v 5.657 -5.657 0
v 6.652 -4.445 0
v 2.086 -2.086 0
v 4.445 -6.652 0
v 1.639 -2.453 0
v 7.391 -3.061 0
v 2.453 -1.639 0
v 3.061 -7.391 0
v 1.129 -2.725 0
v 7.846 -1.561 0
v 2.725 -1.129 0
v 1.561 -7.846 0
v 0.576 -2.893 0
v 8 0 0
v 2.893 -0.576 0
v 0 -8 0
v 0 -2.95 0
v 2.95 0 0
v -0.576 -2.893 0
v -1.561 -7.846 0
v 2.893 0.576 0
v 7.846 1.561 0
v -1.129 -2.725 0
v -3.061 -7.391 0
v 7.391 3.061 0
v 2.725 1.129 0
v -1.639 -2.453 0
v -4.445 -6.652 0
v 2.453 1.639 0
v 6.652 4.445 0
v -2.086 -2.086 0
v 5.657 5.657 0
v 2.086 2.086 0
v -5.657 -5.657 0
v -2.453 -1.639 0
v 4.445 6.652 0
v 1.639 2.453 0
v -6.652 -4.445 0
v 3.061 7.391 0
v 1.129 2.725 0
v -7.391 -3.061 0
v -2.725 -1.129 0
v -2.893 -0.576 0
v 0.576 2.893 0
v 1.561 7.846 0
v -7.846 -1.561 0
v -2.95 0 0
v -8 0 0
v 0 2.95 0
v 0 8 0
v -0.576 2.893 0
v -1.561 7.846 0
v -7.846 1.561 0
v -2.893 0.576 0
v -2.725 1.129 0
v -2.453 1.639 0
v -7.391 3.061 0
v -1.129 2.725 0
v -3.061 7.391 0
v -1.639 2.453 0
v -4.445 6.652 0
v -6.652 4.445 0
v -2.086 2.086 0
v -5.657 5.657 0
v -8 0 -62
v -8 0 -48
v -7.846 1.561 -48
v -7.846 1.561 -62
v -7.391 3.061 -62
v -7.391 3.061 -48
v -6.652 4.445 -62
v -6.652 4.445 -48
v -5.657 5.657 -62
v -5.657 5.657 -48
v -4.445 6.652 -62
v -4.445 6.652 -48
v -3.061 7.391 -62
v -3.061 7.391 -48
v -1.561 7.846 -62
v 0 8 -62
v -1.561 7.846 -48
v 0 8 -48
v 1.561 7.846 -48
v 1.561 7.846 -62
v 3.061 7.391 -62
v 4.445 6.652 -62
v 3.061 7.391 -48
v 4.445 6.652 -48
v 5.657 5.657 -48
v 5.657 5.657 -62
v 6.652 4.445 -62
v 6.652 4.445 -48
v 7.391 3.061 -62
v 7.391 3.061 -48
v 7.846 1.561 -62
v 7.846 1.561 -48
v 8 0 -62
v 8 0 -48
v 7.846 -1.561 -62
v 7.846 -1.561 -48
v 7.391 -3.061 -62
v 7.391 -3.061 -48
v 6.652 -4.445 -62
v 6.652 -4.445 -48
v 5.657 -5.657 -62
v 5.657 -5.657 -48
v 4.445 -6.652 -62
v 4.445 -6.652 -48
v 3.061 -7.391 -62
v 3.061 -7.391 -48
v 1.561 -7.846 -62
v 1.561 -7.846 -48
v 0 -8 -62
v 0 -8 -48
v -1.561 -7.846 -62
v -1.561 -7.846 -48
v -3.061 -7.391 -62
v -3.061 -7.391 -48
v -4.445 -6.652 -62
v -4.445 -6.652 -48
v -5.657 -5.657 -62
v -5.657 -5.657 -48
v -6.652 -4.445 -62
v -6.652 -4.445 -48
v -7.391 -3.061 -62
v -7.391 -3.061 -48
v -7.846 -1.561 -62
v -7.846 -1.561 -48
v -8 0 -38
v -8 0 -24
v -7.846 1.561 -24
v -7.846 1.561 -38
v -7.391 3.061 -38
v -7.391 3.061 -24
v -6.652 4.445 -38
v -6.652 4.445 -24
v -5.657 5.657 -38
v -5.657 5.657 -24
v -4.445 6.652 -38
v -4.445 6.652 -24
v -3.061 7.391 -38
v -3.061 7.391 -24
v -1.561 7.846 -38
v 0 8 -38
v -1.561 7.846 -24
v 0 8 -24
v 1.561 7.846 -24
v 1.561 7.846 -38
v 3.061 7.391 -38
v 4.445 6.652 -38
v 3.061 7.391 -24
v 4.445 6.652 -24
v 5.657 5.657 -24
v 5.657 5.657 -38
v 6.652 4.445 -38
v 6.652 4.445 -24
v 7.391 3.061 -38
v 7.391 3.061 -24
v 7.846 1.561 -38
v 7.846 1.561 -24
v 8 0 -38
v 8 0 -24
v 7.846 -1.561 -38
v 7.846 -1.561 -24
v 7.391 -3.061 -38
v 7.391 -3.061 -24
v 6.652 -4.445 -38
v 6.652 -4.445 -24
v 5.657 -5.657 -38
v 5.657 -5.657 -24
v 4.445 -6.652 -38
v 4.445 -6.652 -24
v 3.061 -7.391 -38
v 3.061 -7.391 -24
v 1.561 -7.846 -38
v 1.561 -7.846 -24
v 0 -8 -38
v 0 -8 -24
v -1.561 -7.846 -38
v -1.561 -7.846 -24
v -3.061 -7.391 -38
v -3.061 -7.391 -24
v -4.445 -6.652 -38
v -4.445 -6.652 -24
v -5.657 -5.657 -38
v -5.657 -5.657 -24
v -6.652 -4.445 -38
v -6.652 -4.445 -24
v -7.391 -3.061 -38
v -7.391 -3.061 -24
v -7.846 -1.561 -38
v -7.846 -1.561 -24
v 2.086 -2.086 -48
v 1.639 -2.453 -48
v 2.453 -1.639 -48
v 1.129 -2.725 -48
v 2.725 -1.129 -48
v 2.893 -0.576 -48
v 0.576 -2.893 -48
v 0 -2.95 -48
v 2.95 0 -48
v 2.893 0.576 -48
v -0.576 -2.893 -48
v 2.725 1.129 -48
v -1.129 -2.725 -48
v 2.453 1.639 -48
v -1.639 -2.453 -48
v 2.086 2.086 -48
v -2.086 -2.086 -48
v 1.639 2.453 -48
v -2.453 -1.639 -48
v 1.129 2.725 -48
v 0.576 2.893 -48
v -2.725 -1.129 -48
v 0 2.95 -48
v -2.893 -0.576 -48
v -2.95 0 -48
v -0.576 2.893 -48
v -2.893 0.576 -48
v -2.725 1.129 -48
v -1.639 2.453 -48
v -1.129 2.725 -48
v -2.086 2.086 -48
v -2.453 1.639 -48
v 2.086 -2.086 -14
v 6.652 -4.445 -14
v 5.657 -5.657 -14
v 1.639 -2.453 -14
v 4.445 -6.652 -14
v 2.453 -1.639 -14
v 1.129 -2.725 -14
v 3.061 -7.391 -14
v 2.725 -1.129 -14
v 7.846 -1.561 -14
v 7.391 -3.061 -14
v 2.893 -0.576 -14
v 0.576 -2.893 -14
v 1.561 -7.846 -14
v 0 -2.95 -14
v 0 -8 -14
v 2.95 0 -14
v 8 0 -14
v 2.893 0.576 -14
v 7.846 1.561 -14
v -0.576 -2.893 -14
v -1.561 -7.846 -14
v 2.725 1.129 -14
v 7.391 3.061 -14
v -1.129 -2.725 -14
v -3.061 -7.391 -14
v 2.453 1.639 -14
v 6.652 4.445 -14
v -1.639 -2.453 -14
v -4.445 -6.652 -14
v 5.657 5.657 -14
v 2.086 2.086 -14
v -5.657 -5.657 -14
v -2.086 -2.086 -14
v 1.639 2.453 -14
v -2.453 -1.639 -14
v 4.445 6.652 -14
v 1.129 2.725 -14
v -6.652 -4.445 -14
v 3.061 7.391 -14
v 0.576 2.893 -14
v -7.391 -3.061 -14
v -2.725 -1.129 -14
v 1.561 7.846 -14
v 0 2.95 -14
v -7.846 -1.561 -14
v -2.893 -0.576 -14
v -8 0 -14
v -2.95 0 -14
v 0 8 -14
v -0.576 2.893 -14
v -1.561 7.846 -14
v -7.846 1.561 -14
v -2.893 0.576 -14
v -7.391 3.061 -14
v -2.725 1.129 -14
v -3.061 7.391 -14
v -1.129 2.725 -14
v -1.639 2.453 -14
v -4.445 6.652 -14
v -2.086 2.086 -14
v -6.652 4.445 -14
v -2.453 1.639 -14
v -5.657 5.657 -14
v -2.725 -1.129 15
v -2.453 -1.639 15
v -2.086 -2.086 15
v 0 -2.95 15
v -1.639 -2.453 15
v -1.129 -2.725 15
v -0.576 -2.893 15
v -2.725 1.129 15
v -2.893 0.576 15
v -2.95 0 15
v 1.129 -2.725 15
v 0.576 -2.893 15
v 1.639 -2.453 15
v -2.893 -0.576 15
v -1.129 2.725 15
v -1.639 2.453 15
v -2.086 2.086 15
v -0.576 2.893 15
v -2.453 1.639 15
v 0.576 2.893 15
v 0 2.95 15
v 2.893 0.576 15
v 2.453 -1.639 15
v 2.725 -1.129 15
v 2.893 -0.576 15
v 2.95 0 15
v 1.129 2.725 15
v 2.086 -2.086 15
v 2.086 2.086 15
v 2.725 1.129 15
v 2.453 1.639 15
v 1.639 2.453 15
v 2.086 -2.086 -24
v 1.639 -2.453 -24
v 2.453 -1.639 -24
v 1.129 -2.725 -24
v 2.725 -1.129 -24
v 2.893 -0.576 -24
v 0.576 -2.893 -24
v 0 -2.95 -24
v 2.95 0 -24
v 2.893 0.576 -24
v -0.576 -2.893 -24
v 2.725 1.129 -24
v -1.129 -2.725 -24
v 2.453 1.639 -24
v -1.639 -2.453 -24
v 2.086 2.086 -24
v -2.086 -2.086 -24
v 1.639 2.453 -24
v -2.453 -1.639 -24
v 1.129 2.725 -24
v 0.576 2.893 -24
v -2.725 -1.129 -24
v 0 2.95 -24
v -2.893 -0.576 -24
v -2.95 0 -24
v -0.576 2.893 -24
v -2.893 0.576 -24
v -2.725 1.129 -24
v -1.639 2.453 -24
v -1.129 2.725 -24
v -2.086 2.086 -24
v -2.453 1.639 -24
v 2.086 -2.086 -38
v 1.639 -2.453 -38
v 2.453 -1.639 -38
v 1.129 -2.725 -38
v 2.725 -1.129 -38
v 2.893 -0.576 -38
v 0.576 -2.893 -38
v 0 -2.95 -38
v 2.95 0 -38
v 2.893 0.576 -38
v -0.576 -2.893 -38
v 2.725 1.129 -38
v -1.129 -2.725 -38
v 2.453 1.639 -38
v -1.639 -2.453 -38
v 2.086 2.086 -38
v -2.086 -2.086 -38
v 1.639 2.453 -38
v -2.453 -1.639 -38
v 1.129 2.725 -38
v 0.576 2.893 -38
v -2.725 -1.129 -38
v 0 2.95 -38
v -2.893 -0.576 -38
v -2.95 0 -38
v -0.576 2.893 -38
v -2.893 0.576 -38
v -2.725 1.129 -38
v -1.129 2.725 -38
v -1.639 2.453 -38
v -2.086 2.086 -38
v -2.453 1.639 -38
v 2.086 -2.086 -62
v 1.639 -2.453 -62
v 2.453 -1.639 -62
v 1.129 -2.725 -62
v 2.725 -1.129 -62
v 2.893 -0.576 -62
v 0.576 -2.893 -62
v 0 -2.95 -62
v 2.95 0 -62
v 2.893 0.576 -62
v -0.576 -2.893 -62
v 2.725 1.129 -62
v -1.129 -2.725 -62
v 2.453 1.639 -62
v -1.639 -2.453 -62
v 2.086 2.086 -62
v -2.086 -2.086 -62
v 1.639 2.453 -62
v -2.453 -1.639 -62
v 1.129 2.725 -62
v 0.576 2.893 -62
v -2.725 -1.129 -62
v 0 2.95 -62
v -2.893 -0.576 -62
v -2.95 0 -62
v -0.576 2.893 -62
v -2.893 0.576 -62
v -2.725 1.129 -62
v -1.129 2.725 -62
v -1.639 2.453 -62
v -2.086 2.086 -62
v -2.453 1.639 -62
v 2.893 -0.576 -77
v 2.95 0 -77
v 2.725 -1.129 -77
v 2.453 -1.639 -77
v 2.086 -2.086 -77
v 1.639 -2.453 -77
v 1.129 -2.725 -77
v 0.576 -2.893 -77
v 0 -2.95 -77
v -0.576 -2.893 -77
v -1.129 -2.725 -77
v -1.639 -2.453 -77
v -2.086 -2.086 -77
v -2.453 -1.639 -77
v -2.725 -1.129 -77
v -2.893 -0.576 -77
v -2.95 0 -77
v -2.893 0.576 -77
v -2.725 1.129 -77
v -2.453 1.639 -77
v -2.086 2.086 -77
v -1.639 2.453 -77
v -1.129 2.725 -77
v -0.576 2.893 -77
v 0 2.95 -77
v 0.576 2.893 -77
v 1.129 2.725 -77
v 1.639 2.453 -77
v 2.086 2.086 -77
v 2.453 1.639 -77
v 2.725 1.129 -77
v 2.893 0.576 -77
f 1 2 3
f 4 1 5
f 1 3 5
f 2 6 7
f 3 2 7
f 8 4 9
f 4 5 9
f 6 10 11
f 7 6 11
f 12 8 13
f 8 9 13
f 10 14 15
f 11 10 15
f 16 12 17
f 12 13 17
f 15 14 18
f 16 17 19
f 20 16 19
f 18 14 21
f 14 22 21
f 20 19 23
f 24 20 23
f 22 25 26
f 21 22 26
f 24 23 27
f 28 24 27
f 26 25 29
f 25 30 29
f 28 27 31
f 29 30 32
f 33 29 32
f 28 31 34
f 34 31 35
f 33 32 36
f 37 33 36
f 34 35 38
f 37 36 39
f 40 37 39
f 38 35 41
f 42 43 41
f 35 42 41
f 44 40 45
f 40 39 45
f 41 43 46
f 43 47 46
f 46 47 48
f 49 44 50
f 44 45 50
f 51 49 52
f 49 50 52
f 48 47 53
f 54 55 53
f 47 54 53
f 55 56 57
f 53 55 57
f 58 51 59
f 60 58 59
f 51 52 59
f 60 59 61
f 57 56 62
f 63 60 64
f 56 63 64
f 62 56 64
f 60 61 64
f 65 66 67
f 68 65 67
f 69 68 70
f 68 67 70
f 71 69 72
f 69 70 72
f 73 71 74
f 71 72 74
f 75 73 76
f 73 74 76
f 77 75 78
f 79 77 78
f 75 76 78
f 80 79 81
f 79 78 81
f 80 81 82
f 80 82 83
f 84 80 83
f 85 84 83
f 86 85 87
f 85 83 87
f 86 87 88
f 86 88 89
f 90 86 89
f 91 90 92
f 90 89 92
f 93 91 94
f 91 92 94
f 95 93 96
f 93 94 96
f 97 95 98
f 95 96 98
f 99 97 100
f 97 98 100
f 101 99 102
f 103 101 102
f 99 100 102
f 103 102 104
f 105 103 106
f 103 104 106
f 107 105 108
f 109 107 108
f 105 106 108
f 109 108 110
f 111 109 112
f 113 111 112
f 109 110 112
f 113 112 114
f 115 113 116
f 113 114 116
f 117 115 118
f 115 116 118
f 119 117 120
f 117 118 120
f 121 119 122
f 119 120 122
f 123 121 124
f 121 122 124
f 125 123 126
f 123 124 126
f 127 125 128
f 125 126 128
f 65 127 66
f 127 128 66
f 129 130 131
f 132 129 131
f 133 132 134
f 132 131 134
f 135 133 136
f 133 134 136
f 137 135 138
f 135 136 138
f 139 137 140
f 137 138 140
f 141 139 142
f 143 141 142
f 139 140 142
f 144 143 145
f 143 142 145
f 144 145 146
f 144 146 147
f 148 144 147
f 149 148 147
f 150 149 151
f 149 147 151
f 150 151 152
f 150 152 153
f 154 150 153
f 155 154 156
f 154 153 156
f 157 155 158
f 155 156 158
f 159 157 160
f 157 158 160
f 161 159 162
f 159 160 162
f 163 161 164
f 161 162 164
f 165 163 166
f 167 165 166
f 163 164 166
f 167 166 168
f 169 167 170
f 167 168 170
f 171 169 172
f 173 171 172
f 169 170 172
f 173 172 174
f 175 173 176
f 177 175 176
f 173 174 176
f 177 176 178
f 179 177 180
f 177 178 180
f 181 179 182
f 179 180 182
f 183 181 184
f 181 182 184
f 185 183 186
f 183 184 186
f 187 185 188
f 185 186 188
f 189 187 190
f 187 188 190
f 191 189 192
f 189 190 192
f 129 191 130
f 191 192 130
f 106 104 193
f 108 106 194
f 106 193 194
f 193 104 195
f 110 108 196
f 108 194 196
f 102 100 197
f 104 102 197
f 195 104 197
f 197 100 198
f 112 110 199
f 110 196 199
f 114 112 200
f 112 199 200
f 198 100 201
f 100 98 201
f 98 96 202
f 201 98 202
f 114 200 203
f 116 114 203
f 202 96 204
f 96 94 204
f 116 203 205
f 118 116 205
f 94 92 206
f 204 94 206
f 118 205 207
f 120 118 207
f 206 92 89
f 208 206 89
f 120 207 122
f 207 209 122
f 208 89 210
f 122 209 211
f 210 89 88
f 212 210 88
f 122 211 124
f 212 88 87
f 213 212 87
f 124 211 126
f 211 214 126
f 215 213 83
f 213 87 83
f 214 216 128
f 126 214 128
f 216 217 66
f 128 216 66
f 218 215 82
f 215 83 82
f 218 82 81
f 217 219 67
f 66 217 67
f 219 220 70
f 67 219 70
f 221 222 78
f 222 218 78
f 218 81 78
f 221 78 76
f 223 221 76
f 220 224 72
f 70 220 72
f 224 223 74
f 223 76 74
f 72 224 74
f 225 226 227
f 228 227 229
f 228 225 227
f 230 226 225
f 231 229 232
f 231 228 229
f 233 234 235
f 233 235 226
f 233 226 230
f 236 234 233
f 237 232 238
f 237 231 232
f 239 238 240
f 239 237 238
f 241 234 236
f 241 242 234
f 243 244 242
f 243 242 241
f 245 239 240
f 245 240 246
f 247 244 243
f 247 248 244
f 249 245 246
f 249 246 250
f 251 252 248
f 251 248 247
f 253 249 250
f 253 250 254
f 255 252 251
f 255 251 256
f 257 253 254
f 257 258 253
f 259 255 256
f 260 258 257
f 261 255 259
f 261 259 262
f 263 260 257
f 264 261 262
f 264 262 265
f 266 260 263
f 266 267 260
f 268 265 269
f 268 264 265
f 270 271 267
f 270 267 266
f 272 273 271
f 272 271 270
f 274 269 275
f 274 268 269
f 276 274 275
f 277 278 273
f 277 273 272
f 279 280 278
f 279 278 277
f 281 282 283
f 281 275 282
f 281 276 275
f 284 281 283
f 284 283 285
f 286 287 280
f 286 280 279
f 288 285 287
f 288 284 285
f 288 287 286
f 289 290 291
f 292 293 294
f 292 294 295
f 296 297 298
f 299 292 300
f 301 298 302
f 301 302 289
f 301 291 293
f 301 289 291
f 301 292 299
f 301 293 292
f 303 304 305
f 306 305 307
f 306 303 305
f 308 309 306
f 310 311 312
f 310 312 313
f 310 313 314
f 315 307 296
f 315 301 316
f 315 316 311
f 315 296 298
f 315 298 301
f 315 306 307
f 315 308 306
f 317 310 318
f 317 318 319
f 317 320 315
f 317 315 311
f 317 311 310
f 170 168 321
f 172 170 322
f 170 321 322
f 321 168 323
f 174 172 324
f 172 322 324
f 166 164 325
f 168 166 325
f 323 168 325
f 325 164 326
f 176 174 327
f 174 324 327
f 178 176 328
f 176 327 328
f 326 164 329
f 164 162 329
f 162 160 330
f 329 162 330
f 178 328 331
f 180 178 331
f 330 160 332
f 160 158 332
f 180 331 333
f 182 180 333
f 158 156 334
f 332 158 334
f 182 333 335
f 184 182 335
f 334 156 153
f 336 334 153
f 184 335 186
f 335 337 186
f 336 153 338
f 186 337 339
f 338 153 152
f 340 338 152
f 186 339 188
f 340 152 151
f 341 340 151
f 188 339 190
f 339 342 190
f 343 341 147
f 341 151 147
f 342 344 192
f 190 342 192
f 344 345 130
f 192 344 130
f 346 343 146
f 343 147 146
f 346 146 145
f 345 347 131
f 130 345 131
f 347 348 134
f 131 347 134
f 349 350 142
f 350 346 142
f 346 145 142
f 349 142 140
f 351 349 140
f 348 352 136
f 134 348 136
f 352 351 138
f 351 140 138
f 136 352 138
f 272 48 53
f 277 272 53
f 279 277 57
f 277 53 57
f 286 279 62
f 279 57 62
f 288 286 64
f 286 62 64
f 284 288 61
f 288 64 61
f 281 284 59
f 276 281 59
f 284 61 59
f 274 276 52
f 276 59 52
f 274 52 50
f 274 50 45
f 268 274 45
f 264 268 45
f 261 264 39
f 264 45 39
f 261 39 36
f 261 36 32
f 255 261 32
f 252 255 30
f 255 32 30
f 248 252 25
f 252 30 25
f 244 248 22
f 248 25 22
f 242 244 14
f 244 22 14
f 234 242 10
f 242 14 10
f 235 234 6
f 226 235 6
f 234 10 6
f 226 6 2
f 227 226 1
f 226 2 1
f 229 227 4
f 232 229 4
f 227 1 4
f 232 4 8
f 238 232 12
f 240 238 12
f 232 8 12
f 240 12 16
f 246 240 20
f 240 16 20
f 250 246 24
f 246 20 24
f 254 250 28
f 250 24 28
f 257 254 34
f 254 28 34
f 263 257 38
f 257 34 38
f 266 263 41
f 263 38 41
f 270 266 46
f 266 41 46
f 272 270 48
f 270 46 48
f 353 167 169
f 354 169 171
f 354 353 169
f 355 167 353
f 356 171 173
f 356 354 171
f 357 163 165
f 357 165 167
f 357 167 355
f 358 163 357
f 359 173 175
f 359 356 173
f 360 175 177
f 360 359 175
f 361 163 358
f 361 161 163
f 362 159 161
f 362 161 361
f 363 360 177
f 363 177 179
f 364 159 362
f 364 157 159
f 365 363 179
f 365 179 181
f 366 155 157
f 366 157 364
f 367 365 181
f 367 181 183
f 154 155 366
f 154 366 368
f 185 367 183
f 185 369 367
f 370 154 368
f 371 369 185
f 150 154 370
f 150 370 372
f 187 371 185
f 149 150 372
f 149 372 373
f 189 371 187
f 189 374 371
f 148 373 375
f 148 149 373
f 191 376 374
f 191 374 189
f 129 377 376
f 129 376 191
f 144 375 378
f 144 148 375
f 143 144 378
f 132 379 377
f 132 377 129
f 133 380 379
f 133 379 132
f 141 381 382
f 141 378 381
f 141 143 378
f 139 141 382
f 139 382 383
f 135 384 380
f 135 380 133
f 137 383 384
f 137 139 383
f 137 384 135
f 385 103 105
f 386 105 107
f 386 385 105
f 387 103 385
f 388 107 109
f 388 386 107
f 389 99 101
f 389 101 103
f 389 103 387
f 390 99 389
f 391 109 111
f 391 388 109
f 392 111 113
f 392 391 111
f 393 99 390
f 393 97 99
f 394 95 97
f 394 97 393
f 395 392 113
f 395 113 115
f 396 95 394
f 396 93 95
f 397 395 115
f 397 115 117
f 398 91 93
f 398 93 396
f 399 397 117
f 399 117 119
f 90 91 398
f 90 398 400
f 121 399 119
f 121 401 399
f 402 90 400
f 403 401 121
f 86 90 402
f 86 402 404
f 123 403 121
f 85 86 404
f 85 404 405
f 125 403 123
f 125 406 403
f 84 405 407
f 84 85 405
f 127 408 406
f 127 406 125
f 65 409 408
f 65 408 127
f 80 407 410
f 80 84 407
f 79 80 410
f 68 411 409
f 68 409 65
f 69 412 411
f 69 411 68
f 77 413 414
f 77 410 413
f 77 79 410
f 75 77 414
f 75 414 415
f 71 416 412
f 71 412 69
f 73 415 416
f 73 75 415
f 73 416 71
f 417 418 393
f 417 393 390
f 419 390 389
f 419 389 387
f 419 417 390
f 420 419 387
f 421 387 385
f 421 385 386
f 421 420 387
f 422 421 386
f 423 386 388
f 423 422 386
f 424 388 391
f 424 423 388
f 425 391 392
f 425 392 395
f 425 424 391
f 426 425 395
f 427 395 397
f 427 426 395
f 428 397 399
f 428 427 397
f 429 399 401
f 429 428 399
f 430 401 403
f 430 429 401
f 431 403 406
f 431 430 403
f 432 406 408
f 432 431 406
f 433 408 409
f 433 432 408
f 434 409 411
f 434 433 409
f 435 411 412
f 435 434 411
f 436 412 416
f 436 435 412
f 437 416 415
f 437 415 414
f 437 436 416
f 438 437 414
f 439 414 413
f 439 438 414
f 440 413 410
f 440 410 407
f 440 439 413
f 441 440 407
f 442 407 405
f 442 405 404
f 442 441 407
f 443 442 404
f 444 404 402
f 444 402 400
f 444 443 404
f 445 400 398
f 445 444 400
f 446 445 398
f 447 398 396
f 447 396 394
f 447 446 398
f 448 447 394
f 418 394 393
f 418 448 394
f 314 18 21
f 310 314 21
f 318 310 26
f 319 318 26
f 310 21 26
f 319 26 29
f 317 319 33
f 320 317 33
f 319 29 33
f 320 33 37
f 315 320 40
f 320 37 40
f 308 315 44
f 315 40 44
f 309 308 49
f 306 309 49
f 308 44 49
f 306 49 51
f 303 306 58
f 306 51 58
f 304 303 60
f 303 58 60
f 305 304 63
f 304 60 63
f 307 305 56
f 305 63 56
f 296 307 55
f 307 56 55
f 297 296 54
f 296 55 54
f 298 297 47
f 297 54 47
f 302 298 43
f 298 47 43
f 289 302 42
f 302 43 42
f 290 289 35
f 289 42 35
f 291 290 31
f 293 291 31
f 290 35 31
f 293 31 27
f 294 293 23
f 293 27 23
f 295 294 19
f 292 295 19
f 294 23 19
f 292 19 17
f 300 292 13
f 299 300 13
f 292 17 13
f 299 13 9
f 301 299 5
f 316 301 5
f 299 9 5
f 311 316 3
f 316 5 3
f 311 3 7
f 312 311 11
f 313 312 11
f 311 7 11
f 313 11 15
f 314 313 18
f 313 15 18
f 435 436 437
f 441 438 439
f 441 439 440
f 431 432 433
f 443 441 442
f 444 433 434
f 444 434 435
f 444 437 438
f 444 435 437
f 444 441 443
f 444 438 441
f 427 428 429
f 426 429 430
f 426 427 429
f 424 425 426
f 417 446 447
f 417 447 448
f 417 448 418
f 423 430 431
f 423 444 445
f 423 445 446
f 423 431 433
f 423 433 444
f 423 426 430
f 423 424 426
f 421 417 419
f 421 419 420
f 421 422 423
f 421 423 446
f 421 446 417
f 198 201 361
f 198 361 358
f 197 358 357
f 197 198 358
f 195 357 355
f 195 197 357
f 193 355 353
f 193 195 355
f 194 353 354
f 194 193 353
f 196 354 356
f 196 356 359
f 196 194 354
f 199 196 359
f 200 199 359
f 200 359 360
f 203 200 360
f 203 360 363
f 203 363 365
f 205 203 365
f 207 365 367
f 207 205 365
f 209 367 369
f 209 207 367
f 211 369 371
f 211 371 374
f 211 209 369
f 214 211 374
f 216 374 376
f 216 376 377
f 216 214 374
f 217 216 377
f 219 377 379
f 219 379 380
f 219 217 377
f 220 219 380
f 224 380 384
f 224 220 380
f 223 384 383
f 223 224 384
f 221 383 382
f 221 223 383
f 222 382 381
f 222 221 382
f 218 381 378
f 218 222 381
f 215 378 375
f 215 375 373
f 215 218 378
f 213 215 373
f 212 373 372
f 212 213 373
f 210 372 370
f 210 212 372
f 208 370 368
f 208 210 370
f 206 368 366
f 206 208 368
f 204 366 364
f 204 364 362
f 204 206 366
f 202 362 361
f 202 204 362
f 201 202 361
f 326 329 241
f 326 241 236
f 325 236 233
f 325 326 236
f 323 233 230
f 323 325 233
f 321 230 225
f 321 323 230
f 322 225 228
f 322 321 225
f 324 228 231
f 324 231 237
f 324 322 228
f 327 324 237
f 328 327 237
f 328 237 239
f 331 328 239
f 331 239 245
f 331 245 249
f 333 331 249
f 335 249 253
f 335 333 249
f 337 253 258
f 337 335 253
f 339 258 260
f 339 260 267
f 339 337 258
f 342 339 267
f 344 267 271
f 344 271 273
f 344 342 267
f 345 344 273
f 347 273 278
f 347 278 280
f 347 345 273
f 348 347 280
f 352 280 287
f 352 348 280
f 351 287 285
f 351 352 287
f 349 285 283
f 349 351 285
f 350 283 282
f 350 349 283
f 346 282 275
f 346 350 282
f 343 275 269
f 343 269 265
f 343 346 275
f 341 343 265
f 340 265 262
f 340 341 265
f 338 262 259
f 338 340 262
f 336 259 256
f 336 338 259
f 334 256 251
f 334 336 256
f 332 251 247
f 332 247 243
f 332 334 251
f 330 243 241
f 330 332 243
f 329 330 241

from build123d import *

# Parameters (mm, degrees)
CROQUIS1_R              = 2.95
SALIENTE_EXTRUIR1_DEPTH = 15
CROQUIS2_R              = 8
SALIENTE_EXTRUIR2_DEPTH = 14
SALIENTE_EXTRUIR3_START = 10
CROQUIS3_R              = 2.95
SALIENTE_EXTRUIR3_DEPTH = 10
CROQUIS4_R              = 8
SALIENTE_EXTRUIR4_DEPTH = 14
SALIENTE_EXTRUIR5_START = 10
CROQUIS5_R              = 2.95
SALIENTE_EXTRUIR5_DEPTH = 10
CROQUIS6_R              = 8
SALIENTE_EXTRUIR6_DEPTH = 14
SALIENTE_EXTRUIR7_START = 15
CROQUIS7_R              = 2.95
SALIENTE_EXTRUIR7_DEPTH = 15


with BuildPart() as part:
    # Croquis1 → Saliente-Extruir1 (new body)
    with BuildSketch(Plane.XY):
        Circle(CROQUIS1_R)
    extrude(amount=SALIENTE_EXTRUIR1_DEPTH)

    # Croquis2 → Saliente-Extruir2 (add)
    with BuildSketch(Plane(origin=(0, 0, 0), x_dir=(-1, 0, 0), z_dir=(0, 0, -1))):
        Circle(CROQUIS2_R)
    extrude(amount=SALIENTE_EXTRUIR2_DEPTH)

    # Croquis3 → Saliente-Extruir3 (add)
    with BuildSketch(Plane(origin=(0, 0, -14), x_dir=(-1, 0, 0), z_dir=(0, 0, -1)).offset(SALIENTE_EXTRUIR3_START)):
        with Locations(Location((0, 0, 0), (0, 0, 180))):
            Circle(CROQUIS3_R)
    extrude(amount=-SALIENTE_EXTRUIR3_DEPTH)

    # Croquis4 → Saliente-Extruir4 (add)
    with BuildSketch(Plane(origin=(0, 0, -24), x_dir=(-1, 0, 0), z_dir=(0, 0, -1))):
        Circle(CROQUIS4_R)
    extrude(amount=SALIENTE_EXTRUIR4_DEPTH)

    # Croquis5 → Saliente-Extruir5 (add)
    with BuildSketch(Plane(origin=(0, 0, -38), x_dir=(-1, 0, 0), z_dir=(0, 0, -1)).offset(SALIENTE_EXTRUIR5_START)):
        with Locations(Location((0, 0, 0), (0, 0, 180))):
            Circle(CROQUIS5_R)
    extrude(amount=-SALIENTE_EXTRUIR5_DEPTH)

    # Croquis6 → Saliente-Extruir6 (add)
    with BuildSketch(Plane(origin=(0, 0, -48), x_dir=(-1, 0, 0), z_dir=(0, 0, -1))):
        Circle(CROQUIS6_R)
    extrude(amount=SALIENTE_EXTRUIR6_DEPTH)

    # Croquis7 → Saliente-Extruir7 (add)
    with BuildSketch(Plane(origin=(0, 0, -62), x_dir=(-1, 0, 0), z_dir=(0, 0, -1)).offset(SALIENTE_EXTRUIR7_START)):
        with Locations(Location((0, 0, 0), (0, 0, 180))):
            Circle(CROQUIS7_R)
    extrude(amount=-SALIENTE_EXTRUIR7_DEPTH)


solid = part.part
